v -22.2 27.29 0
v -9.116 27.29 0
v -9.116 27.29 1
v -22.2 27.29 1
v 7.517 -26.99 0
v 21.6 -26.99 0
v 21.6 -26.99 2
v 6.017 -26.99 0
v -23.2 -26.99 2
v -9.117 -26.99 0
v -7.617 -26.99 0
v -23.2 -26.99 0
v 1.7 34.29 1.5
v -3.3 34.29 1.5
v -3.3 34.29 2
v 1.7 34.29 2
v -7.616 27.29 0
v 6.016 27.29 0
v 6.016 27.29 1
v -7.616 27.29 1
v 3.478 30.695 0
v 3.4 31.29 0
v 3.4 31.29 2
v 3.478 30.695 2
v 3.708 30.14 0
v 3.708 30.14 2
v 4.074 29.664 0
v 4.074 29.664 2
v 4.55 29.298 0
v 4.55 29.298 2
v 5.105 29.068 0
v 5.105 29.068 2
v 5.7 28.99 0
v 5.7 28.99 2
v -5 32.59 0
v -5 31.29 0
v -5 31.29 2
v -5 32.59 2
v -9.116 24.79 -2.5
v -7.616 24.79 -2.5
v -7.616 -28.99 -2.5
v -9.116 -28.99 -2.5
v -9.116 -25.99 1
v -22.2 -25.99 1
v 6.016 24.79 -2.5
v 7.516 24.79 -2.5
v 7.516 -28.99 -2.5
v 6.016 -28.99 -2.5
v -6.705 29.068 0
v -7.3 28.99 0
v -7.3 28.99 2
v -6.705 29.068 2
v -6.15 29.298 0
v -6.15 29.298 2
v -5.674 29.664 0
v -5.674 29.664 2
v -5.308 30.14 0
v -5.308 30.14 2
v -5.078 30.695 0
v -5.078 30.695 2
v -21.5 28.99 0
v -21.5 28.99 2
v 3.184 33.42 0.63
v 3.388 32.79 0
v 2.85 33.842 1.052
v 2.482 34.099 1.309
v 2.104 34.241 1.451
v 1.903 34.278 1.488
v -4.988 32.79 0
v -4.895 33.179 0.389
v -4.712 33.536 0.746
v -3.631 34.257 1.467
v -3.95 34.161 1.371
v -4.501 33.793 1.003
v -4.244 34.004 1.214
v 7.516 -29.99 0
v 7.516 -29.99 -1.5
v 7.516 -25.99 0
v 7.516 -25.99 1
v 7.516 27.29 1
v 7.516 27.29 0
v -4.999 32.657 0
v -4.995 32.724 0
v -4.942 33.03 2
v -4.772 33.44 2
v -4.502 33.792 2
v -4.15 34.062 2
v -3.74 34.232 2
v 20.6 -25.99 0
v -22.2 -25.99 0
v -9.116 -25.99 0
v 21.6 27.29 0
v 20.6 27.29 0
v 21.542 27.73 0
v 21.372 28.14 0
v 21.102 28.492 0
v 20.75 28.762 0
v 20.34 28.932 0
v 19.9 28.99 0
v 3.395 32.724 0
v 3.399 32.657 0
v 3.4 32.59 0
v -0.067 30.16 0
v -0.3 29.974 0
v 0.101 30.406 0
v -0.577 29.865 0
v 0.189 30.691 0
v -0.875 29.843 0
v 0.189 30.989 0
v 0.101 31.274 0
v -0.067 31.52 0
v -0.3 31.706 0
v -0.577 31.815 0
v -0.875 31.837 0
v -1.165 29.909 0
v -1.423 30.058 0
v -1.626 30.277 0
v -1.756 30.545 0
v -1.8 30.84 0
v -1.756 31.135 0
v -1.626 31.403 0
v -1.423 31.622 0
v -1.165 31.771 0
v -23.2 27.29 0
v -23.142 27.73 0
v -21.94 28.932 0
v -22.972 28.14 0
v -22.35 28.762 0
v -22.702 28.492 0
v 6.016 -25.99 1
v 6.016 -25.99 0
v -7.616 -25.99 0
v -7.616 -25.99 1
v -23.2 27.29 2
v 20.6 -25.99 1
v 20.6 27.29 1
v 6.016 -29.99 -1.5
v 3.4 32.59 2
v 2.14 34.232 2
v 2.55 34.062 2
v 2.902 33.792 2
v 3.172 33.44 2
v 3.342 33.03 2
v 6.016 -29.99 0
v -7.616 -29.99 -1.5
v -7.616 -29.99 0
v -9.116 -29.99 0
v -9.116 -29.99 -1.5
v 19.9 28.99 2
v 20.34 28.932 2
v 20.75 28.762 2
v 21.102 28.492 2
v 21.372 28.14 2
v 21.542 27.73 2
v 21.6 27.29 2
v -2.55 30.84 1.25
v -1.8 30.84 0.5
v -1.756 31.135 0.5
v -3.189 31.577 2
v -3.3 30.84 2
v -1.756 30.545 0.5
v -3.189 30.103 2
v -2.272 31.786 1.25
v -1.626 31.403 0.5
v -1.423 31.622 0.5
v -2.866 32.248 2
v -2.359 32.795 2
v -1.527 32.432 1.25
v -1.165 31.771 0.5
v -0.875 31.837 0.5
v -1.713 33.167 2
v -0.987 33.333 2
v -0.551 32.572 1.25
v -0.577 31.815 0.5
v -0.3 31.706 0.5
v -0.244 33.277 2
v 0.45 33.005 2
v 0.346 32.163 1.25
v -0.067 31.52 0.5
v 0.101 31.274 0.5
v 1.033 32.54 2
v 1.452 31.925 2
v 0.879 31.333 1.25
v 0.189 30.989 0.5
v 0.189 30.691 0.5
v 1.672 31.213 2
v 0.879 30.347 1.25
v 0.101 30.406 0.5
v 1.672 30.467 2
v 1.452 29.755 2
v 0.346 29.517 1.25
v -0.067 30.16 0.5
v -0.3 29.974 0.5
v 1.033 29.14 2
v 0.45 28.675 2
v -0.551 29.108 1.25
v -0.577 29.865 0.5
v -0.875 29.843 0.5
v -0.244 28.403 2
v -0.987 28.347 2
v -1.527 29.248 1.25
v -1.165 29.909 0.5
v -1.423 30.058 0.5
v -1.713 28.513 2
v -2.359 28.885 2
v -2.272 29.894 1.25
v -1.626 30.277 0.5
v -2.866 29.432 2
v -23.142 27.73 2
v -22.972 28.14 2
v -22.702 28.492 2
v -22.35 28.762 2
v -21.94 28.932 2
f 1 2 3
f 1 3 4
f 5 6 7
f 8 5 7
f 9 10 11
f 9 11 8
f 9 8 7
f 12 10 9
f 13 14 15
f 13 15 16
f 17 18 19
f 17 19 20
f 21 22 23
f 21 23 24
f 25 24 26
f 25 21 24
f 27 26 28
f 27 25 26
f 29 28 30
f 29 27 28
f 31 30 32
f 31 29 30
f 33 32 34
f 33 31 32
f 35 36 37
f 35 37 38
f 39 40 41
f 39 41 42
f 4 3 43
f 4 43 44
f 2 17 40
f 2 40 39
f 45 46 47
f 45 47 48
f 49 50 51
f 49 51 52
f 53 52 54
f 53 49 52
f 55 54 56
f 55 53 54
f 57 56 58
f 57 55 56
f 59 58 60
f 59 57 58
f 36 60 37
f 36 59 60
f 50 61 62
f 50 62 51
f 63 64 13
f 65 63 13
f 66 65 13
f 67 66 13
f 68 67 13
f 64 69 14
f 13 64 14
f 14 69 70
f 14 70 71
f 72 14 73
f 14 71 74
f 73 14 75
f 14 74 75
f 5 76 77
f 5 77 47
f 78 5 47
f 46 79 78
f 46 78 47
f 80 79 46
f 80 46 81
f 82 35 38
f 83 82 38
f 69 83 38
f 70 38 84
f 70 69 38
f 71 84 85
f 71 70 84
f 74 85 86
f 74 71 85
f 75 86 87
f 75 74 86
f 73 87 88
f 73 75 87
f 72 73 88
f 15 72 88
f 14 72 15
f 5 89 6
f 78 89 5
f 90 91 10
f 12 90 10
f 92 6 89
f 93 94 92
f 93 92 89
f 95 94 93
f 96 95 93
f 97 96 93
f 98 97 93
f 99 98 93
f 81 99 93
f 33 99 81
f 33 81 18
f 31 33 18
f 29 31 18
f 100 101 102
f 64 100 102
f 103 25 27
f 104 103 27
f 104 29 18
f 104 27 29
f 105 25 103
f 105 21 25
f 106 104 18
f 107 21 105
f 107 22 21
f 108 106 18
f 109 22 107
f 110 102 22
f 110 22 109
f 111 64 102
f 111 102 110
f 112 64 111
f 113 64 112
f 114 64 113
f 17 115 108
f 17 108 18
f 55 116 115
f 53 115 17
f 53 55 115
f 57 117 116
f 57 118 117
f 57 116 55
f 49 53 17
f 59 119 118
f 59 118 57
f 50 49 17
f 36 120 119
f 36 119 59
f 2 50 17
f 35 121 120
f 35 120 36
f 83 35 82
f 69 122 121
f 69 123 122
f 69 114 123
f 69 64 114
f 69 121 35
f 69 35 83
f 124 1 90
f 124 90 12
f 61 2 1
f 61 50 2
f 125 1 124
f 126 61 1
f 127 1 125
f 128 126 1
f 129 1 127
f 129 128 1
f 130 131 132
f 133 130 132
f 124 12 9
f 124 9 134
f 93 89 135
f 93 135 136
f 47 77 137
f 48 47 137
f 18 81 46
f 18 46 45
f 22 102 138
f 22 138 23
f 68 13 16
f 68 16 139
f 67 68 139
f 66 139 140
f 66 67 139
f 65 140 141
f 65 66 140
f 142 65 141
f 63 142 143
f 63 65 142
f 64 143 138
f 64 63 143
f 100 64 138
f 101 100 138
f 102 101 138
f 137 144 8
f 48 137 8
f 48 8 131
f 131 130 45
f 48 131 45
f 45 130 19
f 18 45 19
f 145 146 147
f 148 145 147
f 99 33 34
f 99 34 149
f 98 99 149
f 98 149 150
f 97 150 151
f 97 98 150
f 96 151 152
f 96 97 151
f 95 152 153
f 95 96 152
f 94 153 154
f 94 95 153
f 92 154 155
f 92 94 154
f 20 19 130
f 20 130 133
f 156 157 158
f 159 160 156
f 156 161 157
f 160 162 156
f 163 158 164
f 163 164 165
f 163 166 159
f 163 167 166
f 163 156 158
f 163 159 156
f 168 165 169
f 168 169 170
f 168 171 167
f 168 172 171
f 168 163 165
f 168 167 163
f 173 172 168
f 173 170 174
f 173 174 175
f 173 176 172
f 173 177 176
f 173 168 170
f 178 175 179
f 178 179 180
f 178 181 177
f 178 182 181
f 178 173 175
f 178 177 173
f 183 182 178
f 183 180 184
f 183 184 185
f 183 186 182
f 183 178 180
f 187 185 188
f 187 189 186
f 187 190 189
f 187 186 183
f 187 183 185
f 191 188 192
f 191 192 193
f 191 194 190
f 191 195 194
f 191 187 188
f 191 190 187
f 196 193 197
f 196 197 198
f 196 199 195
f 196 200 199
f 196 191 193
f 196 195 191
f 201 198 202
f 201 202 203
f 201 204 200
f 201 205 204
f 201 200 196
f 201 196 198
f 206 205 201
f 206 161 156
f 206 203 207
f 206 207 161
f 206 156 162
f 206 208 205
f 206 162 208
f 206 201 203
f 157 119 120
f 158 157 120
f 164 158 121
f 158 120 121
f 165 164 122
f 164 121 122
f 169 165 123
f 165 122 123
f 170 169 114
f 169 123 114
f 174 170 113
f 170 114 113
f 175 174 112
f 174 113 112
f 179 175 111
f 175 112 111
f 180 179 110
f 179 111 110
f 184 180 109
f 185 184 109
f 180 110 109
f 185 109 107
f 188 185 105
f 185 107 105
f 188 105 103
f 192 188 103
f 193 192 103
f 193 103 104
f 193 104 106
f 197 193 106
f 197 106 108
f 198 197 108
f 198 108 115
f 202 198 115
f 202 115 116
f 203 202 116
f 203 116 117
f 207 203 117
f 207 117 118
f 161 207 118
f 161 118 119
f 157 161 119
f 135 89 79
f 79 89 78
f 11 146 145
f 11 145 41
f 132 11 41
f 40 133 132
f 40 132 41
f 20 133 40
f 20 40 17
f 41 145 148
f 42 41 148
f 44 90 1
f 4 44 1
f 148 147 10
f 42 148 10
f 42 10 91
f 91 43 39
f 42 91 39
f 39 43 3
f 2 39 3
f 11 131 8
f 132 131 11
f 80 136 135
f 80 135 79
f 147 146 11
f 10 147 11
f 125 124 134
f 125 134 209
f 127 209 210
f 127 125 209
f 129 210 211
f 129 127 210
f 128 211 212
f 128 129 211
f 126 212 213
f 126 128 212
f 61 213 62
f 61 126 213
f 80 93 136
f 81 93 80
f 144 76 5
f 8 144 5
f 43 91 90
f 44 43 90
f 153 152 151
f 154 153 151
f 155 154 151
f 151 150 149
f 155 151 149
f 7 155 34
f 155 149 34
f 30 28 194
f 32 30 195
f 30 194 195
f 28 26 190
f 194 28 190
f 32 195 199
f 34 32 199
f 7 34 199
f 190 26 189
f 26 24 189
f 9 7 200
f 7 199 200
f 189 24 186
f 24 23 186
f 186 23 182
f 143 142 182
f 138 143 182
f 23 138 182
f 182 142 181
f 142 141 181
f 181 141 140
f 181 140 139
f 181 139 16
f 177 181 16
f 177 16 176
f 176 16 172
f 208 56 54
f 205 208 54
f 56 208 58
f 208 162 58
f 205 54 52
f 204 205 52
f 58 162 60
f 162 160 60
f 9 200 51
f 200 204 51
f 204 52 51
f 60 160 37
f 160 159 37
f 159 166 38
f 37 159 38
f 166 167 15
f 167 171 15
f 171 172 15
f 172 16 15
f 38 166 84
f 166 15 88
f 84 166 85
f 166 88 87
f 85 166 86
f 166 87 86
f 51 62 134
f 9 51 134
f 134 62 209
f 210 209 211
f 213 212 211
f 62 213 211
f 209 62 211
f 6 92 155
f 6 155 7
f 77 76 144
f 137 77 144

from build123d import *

# Parameters (mm, degrees)
BOSS_EXTRUDE1_DEPTH = 2
CUT_EXTRUDE1_REACH  = 43.449
SKETCH2_R           = 1
SKETCH3_W           = 42.8
SKETCH3_H           = 53.28
CUT_EXTRUDE2_DEPTH  = 1
SKETCH4_W           = 1.5
SKETCH4_H           = 57.28
BOSS_EXTRUDE2_DEPTH = 3.5
SKETCH5_W           = 1
SKETCH5_H           = 3
CUT_EXTRUDE3_DEPTH  = 16.633
CHAMFER1_SIZE       = 1
CHAMFER2_SIZE       = 2.5
CHAMFER3_SIZE       = 1.5
CHAMFER4_SIZE       = 1.5


# Some blends are built 0.0001 mm under size
with BuildPart() as part:
    # Sketch1 → Boss-Extrude1 (new body)
    with BuildSketch(Plane.XY):
        with BuildLine():
            Line((-23.2, -26.99), (-23.2, 27.29))
            ThreePointArc((-23.2, 27.29), (-22.702081528, 28.492081528), (-21.5, 28.99))
            Line((-21.5, 28.99), (-7.3, 28.99))
            ThreePointArc((-7.3, 28.99), (-5.673654403, 29.663654403), (-5, 31.29))
            Line((-5, 31.29), (-5, 32.59))
            ThreePointArc((-5, 32.59), (-4.502081528, 33.792081528), (-3.3, 34.29))
            Line((-3.3, 34.29), (1.7, 34.29))
            ThreePointArc((1.7, 34.29), (2.902081528, 33.792081528), (3.4, 32.59))
            Line((3.4, 32.59), (3.4, 31.29))
            ThreePointArc((3.4, 31.29), (4.073654403, 29.663654403), (5.7, 28.99))
            Line((5.7, 28.99), (19.9, 28.99))
            ThreePointArc((19.9, 28.99), (21.102081528, 28.492081528), (21.6, 27.29))
            Line((21.6, 27.29), (21.6, -26.99))
            Line((21.6, -26.99), (-23.2, -26.99))
        make_face()
    extrude(amount=BOSS_EXTRUDE1_DEPTH)

    # Sketch2 → Cut-Extrude1 (cut, up to next)
    with BuildSketch(Plane(origin=(0, 0, 0), x_dir=(-1, 0, 0), z_dir=(0, 0, -1)), mode=Mode.PRIVATE) as cut_extrude1_sk1:
        with Locations((0.8, 30.84)):
            Circle(SKETCH2_R)
    cut_extrude1_tool1 = extrude(cut_extrude1_sk1.sketch, amount=-CUT_EXTRUDE1_REACH, mode=Mode.PRIVATE) & part.part
    add(cut_extrude1_tool1.solids().sort_by_distance((-0.8, 30.84, 0))[0], mode=Mode.SUBTRACT)

    # Sketch3 → Cut-Extrude2 (cut)
    with BuildSketch(Plane(origin=(0, 0, 0), x_dir=(-1, 0, 0), z_dir=(0, 0, -1))):
        with Locations((0.8, 0.65)):
            Rectangle(SKETCH3_W, SKETCH3_H)
    extrude(amount=-CUT_EXTRUDE2_DEPTH, mode=Mode.SUBTRACT)

    # Sketch4 → Boss-Extrude2 (add)
    with BuildSketch(Plane(origin=(0, 0, 1), x_dir=(-1, 0, 0), z_dir=(0, 0, -1))):
        with Locations((-6.7665, -1.35)):
            Rectangle(SKETCH4_W, SKETCH4_H)
        with Locations((8.3665, -1.35)):
            Rectangle(SKETCH4_W, SKETCH4_H)
    extrude(amount=BOSS_EXTRUDE2_DEPTH)

    # Sketch5 → Cut-Extrude3 (cut)
    with BuildSketch(Plane(origin=(7.5165, 0, 0), x_dir=(0, 0, -1), z_dir=(1, 0, 0))):
        with Locations((-0.5, -28.49)):
            Rectangle(SKETCH5_W, SKETCH5_H)
    extrude(amount=-CUT_EXTRUDE3_DEPTH, mode=Mode.SUBTRACT)

    # Chamfer1
    chamfer1_edges = [part.edges().sort_by_distance(p)[0] for p in [
        (6.7665, -29.99, -2.5),
        (-8.3665, -29.99, -2.5),
    ]]
    chamfer(chamfer1_edges, length=CHAMFER1_SIZE)

    # Chamfer2
    chamfer2_edges = [part.edges().sort_by_distance(p)[0] for p in [
        (6.7665, 27.29, -2.5),
        (-8.3665, 27.29, -2.5),
    ]]
    chamfer(chamfer2_edges, length=CHAMFER2_SIZE - 0.0001)  # a hair under: the kernel refuses the full size

    # Chamfer3
    # the kernel refuses this chamfer: 1.5 mm, written as the material it takes off along each edge
    with BuildSketch(Plane(origin=(-7.157524482, 34.29, 0), x_dir=(0, -0.9996219169112968, -0.02749587661058636), z_dir=(1, 0, 0))) as chamfer3_piece_1:
        Polygon((CHAMFER3_SIZE * 0.999621916911, -CHAMFER3_SIZE * 0.0274958766106), (-CHAMFER3_SIZE * 0.0274958766106, -CHAMFER3_SIZE * 0.999621916911), (0, 0), align=None)
    extrude(amount=12.715048964, mode=Mode.SUBTRACT)

    # Chamfer4
    chamfer4_edges = [part.edges().sort_by_distance(p)[0] for p in [
        (0.2, 30.84, 2),
    ]]
    chamfer(chamfer4_edges, length=CHAMFER4_SIZE)


solid = part.part
